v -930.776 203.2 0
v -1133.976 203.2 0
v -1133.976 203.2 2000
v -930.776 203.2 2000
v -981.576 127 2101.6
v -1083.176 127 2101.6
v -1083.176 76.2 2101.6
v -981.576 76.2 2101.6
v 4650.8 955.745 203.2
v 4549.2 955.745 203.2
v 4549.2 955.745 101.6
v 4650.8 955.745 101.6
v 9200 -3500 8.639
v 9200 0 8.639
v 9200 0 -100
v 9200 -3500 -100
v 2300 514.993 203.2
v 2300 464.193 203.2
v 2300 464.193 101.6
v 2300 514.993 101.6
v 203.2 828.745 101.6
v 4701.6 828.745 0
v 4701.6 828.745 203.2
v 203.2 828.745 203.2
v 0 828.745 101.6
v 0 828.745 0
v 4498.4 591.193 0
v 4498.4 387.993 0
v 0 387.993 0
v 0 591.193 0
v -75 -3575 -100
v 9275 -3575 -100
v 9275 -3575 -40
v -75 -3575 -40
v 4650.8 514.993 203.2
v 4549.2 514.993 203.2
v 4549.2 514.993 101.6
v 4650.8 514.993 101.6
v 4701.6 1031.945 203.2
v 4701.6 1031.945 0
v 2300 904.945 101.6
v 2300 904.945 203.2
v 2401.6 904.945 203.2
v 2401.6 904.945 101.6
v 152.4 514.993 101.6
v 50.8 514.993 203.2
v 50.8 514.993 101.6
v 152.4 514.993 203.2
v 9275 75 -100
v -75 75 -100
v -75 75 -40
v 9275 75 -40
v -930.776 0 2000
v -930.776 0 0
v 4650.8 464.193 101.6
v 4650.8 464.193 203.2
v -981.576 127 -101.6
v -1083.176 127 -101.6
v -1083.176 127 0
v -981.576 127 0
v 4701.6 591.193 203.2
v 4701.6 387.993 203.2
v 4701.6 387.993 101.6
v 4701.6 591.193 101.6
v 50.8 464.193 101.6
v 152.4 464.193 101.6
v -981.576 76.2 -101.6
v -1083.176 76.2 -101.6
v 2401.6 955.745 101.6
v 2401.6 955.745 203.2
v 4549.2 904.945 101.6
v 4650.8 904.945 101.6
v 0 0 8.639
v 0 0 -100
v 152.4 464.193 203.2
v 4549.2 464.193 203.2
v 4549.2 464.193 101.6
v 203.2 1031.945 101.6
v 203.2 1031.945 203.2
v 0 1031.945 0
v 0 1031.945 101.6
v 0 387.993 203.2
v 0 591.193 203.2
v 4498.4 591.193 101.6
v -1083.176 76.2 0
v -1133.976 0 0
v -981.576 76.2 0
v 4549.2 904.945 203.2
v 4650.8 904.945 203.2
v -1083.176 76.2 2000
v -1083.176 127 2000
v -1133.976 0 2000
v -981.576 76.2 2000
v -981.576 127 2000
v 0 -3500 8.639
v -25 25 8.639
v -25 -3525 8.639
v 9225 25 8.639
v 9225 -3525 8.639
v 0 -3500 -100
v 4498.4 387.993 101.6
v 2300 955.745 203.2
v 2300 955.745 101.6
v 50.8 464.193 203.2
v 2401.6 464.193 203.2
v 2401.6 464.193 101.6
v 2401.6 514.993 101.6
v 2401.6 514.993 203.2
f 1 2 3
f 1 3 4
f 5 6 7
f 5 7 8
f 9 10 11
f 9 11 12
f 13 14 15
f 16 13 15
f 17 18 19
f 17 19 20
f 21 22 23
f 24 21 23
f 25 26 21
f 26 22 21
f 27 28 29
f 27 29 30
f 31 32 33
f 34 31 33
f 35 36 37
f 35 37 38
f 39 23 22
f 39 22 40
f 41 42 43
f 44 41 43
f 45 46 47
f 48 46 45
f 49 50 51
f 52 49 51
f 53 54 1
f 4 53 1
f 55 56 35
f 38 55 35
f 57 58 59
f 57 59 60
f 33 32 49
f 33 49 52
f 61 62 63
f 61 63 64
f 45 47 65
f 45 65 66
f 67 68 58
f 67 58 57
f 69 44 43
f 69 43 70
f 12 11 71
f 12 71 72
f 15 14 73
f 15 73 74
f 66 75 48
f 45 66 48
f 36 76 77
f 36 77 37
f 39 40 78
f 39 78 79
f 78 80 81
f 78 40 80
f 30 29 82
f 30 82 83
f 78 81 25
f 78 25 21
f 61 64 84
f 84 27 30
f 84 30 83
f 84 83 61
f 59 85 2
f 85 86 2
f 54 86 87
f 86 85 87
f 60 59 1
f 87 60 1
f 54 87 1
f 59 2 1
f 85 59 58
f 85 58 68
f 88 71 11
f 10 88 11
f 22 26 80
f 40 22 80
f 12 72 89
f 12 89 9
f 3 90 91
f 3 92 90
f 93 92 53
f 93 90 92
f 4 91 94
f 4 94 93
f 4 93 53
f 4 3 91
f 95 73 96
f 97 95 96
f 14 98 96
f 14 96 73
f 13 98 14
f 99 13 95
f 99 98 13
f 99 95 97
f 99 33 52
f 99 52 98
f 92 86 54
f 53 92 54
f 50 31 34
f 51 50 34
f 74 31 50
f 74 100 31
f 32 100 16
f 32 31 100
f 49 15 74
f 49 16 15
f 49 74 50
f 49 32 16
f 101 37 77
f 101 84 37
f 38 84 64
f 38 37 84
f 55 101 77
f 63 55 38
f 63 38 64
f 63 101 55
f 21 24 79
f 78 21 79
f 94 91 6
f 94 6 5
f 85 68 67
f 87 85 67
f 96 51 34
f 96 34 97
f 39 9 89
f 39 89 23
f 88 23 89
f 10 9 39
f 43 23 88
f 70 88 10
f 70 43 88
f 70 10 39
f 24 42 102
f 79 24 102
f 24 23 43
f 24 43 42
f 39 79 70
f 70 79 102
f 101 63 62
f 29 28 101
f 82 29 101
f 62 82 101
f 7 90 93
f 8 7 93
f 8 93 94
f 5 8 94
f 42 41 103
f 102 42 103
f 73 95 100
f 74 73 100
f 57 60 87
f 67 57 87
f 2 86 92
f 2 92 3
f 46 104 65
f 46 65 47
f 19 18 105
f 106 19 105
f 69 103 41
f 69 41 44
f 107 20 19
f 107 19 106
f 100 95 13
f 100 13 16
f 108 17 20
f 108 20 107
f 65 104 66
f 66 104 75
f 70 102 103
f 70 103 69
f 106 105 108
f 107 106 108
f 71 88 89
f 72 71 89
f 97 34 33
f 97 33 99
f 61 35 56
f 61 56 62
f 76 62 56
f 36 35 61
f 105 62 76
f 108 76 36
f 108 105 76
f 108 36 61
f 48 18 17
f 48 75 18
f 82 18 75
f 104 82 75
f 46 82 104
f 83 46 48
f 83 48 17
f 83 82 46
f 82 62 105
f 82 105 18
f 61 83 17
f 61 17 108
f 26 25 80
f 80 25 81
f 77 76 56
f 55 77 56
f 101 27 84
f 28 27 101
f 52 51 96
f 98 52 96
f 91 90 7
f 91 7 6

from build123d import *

# Parameters (mm, degrees)
F3_W      = 203.2
F3_H      = 203.2
F4_DEPTH  = 4701.6
F5_W      = 101.6
F5_H      = 50.8
F6_DEPTH  = 101.6
F7_W      = 203.2
F7_H      = 203.2
F8_DEPTH  = 101.6
F9_DEPTH  = 101.6
F10_W     = 203.2
F10_H     = 203.2
F11_DEPTH = 4701.6
F12_W     = 203.2
F12_H     = 203.2
F13_DEPTH = 101.6
F14_W     = 101.6
F14_H     = 50.8
F15_DEPTH = 101.6
F16_W     = 203.2
F16_H     = 203.2
F17_DEPTH = 2000
F18_W     = 101.6
F18_H     = 50.8
F19_DEPTH = 101.6
F20_W     = 101.6
F20_H     = 50.8
F21_DEPTH = 101.6


with BuildPart() as f2:
    # F2: sweep along a path in F0
    with BuildLine(Plane.XY) as f2_path:
        Line((0, 0), (9200, 0))
        Line((9200, 0), (9200, -3500))
        Line((9200, -3500), (0, -3500))
        Line((0, -3500), (0, 0))
    # F1 (on Right) → F2 (sweep)
    with BuildSketch(Plane.YZ):
        Polygon((0, 8.6390003562), (0, 0), (0, -100), (75, -100), (75, -40), (25, 8.6390003562), align=None)
    sweep(path=f2_path.line, transition=Transition.RIGHT)

    # F7 (on face) → F9 (cut)
    with BuildSketch(Plane(origin=(0, 0, 0), x_dir=(1, 0, 0), z_dir=(0, 0, -1))):
        with Locations((4600, -489.5927694798)):
            Rectangle(F7_W, F7_H)
    extrude(amount=-F9_DEPTH, mode=Mode.SUBTRACT)


with BuildPart() as f4:
    # F3 (on Right) → F4 (new body)
    with BuildSketch(Plane.YZ):
        with Locations((489.5927694798, 101.6)):
            Rectangle(F3_W, F3_H)
    extrude(amount=F4_DEPTH)

    # F5 (on face) → F6 (cut)
    with BuildSketch(Plane.XY.offset(203.2)):
        with Locations((4600, 489.5927694798)):
            Rectangle(F5_W, F5_H)
        with Locations((2350.8, 489.5927694798)):
            Rectangle(F5_W, F5_H)
        with Locations((101.6, 489.5927694798)):
            Rectangle(F5_W, F5_H)
    extrude(amount=-F6_DEPTH, mode=Mode.SUBTRACT)

    # F7 (on face) → F8 (cut)
    with BuildSketch(Plane(origin=(0, 0, 0), x_dir=(1, 0, 0), z_dir=(0, 0, -1))):
        with Locations((4600, -489.5927694798)):
            Rectangle(F7_W, F7_H)
    extrude(amount=-F8_DEPTH, mode=Mode.SUBTRACT)


with BuildPart() as f11:
    # F10 (on Right) → F11 (new body)
    with BuildSketch(Plane.YZ):
        with Locations((930.3449479103, 101.6)):
            Rectangle(F10_W, F10_H)
    extrude(amount=F11_DEPTH)

    # F12 (on face) → F13 (cut)
    with BuildSketch(Plane.XY.offset(203.2)):
        with Locations((101.6, 930.3449479103)):
            Rectangle(F12_W, F12_H)
    extrude(amount=-F13_DEPTH, mode=Mode.SUBTRACT)

    # F14 (on face) → F15 (cut)
    with BuildSketch(Plane.XY.offset(203.2)):
        with Locations((4600, 930.3449479103)):
            Rectangle(F14_W, F14_H)
        with Locations((2350.8, 930.3449479103)):
            Rectangle(F14_W, F14_H)
    extrude(amount=-F15_DEPTH, mode=Mode.SUBTRACT)


with BuildPart() as f17:
    # F16 (on Top) → F17 (new body)
    with BuildSketch(Plane.XY):
        with Locations((-1032.3763402939, 101.6)):
            Rectangle(F16_W, F16_H)
    extrude(amount=F17_DEPTH)

    # F18 (on face) → F19 (join)
    with BuildSketch(Plane.XY.offset(2000)):
        with Locations((-1032.3763402939, 101.6)):
            Rectangle(F18_W, F18_H)
    extrude(amount=F19_DEPTH)

    # F20 (on face) → F21 (join)
    with BuildSketch(Plane(origin=(0, 0, 0), x_dir=(1, 0, 0), z_dir=(0, 0, -1))):
        with Locations((-1032.3763402939, -101.6)):
            Rectangle(F20_W, F20_H)
    extrude(amount=F21_DEPTH)


solid = Compound([f2.part, f4.part, f11.part, f17.part])
